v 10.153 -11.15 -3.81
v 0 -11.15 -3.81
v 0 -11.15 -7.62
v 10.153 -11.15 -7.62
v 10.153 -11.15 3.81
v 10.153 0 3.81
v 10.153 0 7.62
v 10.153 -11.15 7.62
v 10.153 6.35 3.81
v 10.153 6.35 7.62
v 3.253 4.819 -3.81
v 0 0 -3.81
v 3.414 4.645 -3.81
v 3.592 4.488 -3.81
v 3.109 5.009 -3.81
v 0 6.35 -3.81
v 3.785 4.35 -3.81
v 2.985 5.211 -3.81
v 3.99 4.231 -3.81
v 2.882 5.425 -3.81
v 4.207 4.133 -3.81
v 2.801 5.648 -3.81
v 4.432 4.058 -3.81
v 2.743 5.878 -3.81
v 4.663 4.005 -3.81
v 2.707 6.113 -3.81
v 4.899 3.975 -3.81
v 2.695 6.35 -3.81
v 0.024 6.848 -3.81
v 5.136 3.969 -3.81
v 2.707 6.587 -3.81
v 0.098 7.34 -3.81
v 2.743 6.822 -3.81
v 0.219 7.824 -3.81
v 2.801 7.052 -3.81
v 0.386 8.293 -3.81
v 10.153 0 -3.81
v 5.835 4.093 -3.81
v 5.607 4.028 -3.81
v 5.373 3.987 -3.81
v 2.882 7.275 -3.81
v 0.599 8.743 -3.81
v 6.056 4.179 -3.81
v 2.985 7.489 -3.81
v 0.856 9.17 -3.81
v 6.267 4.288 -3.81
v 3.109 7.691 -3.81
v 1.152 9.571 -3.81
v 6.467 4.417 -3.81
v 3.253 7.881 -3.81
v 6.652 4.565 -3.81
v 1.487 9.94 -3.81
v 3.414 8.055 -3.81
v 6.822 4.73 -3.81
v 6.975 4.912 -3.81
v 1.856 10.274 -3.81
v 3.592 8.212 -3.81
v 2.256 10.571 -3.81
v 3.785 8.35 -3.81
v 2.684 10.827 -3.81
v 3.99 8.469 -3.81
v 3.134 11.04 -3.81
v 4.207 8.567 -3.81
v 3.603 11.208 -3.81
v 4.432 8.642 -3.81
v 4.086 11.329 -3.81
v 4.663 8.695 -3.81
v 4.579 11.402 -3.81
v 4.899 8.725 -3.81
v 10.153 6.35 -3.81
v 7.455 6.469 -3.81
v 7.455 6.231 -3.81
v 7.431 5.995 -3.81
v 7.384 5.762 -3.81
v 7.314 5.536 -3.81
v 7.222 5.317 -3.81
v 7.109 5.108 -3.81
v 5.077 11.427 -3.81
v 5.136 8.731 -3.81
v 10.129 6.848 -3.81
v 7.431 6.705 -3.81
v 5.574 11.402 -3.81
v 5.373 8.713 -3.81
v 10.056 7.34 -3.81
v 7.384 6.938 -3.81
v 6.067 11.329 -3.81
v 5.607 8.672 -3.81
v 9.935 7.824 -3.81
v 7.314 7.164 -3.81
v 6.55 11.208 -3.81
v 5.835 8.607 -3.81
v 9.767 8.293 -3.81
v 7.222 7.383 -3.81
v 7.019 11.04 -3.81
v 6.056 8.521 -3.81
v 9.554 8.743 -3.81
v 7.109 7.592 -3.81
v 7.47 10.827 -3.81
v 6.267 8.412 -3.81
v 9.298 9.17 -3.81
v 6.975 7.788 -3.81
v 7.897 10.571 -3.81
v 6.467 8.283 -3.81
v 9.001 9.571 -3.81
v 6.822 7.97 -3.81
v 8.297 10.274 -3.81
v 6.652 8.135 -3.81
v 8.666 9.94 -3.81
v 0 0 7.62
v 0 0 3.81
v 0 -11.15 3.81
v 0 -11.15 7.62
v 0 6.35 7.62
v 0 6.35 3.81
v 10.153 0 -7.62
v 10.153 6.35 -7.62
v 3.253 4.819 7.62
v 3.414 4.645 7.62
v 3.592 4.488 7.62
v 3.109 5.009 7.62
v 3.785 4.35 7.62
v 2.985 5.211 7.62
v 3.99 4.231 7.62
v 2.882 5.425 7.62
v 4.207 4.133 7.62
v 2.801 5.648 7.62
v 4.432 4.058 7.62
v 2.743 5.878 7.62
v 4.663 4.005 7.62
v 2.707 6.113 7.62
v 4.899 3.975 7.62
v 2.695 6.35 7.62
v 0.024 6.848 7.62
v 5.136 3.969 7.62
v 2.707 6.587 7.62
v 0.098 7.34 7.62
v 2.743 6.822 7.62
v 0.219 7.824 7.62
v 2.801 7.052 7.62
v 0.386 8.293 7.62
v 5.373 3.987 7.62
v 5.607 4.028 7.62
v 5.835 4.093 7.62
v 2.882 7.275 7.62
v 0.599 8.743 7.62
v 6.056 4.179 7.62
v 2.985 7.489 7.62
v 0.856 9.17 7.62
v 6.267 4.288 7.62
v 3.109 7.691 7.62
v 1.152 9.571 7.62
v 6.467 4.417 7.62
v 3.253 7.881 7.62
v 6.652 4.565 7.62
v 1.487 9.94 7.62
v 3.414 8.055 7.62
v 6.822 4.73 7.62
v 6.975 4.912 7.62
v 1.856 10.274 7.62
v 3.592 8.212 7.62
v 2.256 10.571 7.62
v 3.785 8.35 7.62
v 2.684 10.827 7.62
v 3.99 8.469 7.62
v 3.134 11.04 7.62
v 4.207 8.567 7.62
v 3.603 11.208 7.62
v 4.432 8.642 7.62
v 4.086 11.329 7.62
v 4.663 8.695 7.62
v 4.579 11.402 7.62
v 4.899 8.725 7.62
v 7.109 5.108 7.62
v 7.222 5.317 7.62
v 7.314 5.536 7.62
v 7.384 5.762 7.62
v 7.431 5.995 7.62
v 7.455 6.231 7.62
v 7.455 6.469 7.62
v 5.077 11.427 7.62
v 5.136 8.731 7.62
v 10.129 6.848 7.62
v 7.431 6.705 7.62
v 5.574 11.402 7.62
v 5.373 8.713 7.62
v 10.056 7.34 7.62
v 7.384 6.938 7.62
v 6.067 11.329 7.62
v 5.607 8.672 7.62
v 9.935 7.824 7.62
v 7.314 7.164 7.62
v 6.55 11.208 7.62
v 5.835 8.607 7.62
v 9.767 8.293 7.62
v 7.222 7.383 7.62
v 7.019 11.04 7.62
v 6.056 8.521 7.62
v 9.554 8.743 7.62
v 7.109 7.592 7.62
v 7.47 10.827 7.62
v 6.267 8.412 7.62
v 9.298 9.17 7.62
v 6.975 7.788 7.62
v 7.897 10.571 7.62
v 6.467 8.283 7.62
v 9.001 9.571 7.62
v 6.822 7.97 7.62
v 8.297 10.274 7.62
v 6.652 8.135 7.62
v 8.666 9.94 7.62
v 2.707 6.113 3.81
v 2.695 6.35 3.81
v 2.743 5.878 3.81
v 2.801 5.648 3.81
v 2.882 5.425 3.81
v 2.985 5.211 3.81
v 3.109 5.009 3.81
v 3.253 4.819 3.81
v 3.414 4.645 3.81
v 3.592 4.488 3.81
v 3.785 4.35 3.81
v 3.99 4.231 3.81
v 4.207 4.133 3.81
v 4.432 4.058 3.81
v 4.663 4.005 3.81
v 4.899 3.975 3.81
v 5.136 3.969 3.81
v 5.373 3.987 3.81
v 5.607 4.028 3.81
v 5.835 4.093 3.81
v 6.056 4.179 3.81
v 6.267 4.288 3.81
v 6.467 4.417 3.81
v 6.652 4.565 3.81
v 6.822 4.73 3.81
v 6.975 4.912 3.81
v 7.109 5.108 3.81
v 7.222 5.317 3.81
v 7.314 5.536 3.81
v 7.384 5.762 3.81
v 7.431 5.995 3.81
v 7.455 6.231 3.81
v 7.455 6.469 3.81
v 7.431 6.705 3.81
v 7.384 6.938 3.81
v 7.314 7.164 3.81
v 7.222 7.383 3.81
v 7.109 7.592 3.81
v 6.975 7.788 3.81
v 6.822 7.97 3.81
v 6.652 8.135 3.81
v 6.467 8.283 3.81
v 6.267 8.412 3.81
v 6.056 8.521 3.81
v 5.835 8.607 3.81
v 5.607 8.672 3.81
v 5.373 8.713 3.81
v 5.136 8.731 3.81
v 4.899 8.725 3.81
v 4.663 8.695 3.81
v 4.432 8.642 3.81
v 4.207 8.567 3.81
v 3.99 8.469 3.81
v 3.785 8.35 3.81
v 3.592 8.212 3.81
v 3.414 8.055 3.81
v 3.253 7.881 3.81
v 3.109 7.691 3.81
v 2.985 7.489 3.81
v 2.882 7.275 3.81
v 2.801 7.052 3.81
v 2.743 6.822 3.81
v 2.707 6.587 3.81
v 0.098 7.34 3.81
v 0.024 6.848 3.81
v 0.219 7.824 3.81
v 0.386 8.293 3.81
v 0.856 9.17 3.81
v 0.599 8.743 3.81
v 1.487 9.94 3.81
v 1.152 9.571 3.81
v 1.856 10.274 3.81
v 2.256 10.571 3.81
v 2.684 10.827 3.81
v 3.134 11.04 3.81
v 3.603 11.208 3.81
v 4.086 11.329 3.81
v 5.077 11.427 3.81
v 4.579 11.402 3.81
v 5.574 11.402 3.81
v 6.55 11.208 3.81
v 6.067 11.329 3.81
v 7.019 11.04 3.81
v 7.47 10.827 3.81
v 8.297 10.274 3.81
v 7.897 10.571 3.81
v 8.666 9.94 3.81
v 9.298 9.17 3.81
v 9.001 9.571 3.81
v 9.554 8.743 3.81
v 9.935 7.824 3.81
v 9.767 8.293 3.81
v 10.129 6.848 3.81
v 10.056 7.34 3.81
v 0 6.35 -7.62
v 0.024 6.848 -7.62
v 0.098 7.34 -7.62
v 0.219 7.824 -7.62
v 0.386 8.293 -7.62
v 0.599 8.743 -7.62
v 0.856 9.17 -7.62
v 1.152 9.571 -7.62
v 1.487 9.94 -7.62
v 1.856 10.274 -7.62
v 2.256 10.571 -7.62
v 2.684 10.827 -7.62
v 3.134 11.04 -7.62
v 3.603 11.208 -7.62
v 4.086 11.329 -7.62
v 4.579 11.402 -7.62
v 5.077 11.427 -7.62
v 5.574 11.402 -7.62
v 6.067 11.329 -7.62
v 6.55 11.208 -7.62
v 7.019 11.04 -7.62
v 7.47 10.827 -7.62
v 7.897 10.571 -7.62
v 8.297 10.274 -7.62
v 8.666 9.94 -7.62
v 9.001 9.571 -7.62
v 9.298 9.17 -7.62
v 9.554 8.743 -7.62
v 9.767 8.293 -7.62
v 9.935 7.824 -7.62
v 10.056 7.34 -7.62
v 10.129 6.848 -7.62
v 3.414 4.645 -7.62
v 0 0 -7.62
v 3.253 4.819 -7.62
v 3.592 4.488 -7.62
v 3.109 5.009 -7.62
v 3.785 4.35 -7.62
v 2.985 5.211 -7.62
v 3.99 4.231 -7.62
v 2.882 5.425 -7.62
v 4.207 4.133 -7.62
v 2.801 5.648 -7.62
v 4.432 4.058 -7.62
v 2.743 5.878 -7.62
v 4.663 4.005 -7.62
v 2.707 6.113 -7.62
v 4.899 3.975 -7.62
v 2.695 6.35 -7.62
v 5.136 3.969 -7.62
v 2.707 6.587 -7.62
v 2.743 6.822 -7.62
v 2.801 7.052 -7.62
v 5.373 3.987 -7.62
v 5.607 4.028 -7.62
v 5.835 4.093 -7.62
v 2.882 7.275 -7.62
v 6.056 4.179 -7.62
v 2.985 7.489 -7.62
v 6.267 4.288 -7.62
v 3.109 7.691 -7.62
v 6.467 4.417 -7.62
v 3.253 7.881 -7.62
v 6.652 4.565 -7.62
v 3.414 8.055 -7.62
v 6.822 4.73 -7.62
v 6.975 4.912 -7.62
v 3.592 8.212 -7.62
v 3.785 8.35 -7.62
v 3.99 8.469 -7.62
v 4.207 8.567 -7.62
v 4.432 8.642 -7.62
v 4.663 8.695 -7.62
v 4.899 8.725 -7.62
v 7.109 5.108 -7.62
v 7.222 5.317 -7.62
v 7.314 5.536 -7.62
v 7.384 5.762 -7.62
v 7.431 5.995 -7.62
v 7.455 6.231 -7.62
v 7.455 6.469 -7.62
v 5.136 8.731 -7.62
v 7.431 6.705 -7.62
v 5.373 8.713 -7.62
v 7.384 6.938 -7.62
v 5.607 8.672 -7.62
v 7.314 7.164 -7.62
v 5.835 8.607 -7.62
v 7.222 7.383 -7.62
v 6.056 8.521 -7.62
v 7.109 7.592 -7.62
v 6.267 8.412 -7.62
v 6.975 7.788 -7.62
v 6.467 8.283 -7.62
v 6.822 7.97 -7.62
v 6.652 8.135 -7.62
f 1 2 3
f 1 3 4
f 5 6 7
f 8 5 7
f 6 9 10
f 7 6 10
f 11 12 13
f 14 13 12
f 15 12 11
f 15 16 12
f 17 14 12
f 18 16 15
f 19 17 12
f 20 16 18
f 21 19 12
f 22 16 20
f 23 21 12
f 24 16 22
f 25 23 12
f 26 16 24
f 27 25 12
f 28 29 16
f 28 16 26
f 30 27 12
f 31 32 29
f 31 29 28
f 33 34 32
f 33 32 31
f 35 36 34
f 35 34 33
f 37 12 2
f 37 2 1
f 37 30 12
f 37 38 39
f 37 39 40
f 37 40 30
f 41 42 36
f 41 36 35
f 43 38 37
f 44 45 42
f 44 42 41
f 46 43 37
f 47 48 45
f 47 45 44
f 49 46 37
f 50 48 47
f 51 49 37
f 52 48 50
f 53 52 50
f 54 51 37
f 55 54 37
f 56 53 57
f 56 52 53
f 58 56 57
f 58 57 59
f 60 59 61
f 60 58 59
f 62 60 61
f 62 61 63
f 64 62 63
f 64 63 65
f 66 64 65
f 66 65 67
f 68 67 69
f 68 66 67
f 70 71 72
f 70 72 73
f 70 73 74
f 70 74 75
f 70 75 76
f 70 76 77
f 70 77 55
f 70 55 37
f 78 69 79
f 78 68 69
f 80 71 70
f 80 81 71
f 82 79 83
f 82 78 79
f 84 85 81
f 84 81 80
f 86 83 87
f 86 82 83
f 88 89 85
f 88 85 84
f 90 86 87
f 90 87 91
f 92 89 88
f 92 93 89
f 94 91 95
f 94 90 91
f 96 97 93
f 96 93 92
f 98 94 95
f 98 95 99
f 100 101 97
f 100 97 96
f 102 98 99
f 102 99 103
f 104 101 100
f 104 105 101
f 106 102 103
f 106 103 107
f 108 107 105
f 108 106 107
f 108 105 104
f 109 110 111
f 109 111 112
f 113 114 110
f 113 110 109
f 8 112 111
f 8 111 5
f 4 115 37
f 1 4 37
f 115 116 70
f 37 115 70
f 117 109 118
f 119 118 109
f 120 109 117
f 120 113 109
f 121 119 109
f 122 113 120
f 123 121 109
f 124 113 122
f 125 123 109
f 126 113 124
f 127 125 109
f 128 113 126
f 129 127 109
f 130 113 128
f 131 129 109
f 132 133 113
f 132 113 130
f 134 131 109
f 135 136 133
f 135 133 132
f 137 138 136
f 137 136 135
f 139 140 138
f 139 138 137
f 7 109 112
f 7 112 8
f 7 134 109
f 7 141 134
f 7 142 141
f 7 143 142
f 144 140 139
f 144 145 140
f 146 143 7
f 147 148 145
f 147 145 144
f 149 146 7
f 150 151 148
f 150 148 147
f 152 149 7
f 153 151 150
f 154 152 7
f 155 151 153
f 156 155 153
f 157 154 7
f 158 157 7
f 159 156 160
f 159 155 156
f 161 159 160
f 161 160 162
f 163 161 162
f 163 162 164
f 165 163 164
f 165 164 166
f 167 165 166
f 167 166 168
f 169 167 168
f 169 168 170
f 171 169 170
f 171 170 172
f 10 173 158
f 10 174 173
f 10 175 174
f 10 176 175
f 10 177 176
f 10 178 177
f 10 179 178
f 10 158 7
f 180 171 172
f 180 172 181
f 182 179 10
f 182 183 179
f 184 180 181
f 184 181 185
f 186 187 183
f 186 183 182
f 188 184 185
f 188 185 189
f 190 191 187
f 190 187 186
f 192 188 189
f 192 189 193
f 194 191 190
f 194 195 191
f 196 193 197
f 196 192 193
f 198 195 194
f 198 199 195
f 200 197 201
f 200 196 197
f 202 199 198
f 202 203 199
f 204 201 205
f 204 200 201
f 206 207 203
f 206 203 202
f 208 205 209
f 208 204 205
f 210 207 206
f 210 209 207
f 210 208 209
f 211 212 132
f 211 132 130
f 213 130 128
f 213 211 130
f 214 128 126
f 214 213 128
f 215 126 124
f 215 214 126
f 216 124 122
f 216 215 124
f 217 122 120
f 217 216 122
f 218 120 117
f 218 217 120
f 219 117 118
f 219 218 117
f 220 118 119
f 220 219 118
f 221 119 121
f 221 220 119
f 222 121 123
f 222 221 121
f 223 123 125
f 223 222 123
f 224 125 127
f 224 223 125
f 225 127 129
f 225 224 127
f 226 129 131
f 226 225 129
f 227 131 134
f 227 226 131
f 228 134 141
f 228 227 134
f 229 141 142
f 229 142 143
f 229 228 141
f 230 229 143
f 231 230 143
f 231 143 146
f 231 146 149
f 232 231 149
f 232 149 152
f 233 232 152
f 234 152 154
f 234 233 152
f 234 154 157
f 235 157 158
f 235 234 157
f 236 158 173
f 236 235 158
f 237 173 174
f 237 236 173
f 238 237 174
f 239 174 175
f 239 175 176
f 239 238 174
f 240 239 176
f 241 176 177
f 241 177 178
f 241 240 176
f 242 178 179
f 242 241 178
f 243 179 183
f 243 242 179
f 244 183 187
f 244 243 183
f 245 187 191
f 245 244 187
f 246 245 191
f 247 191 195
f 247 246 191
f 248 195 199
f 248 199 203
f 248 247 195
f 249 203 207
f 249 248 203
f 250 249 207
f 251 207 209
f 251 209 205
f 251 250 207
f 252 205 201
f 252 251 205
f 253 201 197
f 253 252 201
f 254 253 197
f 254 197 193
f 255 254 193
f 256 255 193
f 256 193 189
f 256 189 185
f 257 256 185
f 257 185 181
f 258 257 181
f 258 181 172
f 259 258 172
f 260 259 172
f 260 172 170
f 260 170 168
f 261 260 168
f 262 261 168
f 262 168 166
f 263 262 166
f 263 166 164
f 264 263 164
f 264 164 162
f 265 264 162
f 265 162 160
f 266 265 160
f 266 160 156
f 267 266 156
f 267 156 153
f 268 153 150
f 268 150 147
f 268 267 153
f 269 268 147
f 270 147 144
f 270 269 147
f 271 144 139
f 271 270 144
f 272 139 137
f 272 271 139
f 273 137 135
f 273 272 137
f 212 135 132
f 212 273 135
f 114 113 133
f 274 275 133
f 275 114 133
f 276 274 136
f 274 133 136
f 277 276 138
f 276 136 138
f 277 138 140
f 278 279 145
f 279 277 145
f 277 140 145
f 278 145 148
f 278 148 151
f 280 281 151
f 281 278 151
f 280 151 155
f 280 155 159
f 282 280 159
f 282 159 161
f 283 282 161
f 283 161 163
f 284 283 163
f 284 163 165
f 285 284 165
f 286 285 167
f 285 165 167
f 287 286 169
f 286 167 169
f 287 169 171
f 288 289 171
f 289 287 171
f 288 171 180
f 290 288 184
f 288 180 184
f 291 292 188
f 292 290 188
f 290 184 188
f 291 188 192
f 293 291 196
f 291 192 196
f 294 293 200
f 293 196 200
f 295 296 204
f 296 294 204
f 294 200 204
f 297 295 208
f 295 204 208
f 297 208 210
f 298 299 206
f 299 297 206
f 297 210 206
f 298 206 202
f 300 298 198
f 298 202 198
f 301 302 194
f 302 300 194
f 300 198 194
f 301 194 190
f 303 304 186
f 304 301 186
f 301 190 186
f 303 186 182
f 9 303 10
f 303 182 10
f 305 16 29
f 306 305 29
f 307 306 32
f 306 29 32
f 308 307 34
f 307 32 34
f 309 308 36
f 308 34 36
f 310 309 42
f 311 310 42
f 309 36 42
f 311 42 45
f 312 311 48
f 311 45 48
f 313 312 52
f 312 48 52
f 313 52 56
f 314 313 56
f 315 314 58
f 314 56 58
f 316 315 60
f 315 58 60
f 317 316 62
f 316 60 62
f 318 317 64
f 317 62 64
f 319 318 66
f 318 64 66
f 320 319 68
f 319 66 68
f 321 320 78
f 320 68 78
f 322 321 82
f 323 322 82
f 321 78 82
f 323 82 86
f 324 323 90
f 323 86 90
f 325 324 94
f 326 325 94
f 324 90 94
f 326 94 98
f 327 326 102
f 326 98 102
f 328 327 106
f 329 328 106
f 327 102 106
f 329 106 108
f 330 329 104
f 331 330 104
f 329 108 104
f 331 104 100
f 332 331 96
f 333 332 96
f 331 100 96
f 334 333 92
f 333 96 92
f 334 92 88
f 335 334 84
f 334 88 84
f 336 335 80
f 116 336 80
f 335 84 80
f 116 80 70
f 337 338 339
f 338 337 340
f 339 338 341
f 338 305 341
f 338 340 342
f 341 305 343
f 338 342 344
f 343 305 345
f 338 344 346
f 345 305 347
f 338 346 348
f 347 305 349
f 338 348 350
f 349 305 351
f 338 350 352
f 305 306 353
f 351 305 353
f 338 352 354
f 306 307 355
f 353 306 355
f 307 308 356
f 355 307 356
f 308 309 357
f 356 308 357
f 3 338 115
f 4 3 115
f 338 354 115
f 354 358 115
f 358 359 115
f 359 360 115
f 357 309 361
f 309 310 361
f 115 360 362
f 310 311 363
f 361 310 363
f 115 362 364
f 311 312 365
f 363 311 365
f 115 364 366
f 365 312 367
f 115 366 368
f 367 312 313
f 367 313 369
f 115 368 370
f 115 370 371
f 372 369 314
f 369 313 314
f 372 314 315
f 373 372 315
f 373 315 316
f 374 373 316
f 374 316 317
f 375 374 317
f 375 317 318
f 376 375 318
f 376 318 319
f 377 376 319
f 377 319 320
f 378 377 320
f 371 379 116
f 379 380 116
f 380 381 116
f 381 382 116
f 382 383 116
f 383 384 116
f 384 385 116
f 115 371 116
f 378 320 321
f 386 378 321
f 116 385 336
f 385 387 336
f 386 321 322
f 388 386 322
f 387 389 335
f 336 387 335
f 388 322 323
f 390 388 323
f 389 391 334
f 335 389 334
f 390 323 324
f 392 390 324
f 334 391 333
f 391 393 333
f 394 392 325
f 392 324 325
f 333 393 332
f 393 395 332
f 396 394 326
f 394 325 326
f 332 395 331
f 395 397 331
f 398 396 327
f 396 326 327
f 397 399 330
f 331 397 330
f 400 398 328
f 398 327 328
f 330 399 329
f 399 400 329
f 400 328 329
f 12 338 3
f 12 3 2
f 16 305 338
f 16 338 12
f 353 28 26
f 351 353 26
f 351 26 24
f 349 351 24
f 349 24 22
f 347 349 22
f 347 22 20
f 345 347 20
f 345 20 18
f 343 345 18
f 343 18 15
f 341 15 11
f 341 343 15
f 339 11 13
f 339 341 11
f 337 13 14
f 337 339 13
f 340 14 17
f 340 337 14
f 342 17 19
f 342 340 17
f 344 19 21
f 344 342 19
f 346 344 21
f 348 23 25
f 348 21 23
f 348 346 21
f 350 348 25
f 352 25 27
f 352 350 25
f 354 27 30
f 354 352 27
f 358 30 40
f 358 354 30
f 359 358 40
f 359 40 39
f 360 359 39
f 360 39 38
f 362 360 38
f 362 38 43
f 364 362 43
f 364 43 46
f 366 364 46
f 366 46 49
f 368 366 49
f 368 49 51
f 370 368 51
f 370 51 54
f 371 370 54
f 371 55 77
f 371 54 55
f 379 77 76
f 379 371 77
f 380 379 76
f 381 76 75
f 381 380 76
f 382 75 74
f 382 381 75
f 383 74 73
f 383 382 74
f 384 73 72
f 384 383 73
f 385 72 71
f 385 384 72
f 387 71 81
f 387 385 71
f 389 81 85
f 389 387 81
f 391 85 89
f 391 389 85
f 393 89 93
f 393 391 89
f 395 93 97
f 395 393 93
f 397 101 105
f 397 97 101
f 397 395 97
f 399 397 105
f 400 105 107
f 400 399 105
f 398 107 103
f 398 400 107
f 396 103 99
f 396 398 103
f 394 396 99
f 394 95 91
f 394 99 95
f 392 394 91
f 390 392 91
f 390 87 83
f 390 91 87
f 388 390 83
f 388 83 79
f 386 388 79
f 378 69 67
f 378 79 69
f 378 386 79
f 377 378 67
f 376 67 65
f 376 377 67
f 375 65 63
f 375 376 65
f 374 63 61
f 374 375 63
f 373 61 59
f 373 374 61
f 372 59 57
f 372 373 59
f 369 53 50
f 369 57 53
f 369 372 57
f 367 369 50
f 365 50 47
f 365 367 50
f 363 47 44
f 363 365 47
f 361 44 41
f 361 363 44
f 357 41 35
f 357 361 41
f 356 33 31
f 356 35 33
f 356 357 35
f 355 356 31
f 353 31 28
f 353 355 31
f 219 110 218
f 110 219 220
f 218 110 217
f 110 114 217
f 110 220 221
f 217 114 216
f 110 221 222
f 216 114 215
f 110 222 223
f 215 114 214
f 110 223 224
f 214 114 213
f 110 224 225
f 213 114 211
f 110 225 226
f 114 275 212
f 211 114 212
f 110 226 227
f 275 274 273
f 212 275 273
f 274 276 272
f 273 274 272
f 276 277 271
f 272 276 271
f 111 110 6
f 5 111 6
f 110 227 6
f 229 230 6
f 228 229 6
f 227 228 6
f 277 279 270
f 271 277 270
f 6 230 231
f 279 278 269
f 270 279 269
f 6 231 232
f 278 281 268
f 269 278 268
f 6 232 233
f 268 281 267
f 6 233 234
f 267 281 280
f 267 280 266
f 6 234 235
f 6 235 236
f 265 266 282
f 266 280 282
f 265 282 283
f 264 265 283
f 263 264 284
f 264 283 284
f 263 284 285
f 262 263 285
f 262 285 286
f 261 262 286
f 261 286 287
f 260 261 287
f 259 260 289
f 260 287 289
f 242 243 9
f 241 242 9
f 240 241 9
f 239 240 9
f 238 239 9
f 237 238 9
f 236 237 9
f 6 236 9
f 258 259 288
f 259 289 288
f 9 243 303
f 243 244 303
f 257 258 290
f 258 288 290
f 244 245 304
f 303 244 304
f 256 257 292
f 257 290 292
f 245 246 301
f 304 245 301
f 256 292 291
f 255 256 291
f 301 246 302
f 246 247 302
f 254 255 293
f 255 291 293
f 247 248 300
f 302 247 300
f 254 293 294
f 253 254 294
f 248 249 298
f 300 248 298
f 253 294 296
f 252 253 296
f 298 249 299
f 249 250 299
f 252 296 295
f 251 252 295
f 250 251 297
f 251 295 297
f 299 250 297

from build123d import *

# Parameters (mm, degrees)
SKETCH1_R           = 2.38125
BOSS_EXTRUDE1_DEPTH = 7.62
SKETCH2_W           = 7.62
SKETCH2_H           = 24.17124054
CUT_EXTRUDE1_DEPTH  = 25.4
SKETCH3_W           = 10.153313745
SKETCH3_H           = 3.81
BOSS_EXTRUDE2_DEPTH = 11.15


with BuildPart() as part:
    # Sketch1 → Boss-Extrude1 (new, symmetric)
    with BuildSketch(Plane.XY):
        with BuildLine():
            Line((0, 6.35), (0, 0))
            Line((0, 0), (10.153313745, 0))
            Line((10.153313745, 0), (10.153313745, 6.35))
            ThreePointArc((10.153313745, 6.35), (5.076656873, 11.426656873), (0, 6.35))
        make_face()
        with Locations((5.076656873, 6.35)):
            Circle(SKETCH1_R, mode=Mode.SUBTRACT)
    extrude(amount=BOSS_EXTRUDE1_DEPTH, both=True)

    # Sketch2 → Cut-Extrude1 (cut)
    with BuildSketch(Plane.ZY):
        with Locations((0, 12.08562027)):
            Rectangle(SKETCH2_W, SKETCH2_H)
    extrude(amount=-CUT_EXTRUDE1_DEPTH, mode=Mode.SUBTRACT)


with BuildPart() as cut_extrude1_piece_1:
    # of the separate pieces the step leaves, piece 1, a body of its own (cut_extrude1_pieces)
    add(part.part.solids().sort_by_distance((10.153313745, 6.35, -3.81))[0])



with BuildPart() as cut_extrude1_piece_2:
    # of the separate pieces the step leaves, piece 2, a body of its own (cut_extrude1_pieces)
    add(part.part.solids().sort_by_distance((10.153313745, 6.35, 7.62))[0])


with BuildPart() as cut_extrude1_piece_1_1:
    add(cut_extrude1_piece_1.part)

    add(cut_extrude1_piece_2.part)  # Boss-Extrude2 merges Cut-Extrude1 piece 2
    # Sketch3 → Boss-Extrude2 (add)
    with BuildSketch(Plane.XZ):
        with Locations((5.076656873, 5.715)):
            Rectangle(SKETCH3_W, SKETCH3_H)
        with Locations((5.076656873, -5.715)):
            Rectangle(SKETCH3_W, SKETCH3_H)
    extrude(amount=BOSS_EXTRUDE2_DEPTH)


solid = cut_extrude1_piece_1_1.part
